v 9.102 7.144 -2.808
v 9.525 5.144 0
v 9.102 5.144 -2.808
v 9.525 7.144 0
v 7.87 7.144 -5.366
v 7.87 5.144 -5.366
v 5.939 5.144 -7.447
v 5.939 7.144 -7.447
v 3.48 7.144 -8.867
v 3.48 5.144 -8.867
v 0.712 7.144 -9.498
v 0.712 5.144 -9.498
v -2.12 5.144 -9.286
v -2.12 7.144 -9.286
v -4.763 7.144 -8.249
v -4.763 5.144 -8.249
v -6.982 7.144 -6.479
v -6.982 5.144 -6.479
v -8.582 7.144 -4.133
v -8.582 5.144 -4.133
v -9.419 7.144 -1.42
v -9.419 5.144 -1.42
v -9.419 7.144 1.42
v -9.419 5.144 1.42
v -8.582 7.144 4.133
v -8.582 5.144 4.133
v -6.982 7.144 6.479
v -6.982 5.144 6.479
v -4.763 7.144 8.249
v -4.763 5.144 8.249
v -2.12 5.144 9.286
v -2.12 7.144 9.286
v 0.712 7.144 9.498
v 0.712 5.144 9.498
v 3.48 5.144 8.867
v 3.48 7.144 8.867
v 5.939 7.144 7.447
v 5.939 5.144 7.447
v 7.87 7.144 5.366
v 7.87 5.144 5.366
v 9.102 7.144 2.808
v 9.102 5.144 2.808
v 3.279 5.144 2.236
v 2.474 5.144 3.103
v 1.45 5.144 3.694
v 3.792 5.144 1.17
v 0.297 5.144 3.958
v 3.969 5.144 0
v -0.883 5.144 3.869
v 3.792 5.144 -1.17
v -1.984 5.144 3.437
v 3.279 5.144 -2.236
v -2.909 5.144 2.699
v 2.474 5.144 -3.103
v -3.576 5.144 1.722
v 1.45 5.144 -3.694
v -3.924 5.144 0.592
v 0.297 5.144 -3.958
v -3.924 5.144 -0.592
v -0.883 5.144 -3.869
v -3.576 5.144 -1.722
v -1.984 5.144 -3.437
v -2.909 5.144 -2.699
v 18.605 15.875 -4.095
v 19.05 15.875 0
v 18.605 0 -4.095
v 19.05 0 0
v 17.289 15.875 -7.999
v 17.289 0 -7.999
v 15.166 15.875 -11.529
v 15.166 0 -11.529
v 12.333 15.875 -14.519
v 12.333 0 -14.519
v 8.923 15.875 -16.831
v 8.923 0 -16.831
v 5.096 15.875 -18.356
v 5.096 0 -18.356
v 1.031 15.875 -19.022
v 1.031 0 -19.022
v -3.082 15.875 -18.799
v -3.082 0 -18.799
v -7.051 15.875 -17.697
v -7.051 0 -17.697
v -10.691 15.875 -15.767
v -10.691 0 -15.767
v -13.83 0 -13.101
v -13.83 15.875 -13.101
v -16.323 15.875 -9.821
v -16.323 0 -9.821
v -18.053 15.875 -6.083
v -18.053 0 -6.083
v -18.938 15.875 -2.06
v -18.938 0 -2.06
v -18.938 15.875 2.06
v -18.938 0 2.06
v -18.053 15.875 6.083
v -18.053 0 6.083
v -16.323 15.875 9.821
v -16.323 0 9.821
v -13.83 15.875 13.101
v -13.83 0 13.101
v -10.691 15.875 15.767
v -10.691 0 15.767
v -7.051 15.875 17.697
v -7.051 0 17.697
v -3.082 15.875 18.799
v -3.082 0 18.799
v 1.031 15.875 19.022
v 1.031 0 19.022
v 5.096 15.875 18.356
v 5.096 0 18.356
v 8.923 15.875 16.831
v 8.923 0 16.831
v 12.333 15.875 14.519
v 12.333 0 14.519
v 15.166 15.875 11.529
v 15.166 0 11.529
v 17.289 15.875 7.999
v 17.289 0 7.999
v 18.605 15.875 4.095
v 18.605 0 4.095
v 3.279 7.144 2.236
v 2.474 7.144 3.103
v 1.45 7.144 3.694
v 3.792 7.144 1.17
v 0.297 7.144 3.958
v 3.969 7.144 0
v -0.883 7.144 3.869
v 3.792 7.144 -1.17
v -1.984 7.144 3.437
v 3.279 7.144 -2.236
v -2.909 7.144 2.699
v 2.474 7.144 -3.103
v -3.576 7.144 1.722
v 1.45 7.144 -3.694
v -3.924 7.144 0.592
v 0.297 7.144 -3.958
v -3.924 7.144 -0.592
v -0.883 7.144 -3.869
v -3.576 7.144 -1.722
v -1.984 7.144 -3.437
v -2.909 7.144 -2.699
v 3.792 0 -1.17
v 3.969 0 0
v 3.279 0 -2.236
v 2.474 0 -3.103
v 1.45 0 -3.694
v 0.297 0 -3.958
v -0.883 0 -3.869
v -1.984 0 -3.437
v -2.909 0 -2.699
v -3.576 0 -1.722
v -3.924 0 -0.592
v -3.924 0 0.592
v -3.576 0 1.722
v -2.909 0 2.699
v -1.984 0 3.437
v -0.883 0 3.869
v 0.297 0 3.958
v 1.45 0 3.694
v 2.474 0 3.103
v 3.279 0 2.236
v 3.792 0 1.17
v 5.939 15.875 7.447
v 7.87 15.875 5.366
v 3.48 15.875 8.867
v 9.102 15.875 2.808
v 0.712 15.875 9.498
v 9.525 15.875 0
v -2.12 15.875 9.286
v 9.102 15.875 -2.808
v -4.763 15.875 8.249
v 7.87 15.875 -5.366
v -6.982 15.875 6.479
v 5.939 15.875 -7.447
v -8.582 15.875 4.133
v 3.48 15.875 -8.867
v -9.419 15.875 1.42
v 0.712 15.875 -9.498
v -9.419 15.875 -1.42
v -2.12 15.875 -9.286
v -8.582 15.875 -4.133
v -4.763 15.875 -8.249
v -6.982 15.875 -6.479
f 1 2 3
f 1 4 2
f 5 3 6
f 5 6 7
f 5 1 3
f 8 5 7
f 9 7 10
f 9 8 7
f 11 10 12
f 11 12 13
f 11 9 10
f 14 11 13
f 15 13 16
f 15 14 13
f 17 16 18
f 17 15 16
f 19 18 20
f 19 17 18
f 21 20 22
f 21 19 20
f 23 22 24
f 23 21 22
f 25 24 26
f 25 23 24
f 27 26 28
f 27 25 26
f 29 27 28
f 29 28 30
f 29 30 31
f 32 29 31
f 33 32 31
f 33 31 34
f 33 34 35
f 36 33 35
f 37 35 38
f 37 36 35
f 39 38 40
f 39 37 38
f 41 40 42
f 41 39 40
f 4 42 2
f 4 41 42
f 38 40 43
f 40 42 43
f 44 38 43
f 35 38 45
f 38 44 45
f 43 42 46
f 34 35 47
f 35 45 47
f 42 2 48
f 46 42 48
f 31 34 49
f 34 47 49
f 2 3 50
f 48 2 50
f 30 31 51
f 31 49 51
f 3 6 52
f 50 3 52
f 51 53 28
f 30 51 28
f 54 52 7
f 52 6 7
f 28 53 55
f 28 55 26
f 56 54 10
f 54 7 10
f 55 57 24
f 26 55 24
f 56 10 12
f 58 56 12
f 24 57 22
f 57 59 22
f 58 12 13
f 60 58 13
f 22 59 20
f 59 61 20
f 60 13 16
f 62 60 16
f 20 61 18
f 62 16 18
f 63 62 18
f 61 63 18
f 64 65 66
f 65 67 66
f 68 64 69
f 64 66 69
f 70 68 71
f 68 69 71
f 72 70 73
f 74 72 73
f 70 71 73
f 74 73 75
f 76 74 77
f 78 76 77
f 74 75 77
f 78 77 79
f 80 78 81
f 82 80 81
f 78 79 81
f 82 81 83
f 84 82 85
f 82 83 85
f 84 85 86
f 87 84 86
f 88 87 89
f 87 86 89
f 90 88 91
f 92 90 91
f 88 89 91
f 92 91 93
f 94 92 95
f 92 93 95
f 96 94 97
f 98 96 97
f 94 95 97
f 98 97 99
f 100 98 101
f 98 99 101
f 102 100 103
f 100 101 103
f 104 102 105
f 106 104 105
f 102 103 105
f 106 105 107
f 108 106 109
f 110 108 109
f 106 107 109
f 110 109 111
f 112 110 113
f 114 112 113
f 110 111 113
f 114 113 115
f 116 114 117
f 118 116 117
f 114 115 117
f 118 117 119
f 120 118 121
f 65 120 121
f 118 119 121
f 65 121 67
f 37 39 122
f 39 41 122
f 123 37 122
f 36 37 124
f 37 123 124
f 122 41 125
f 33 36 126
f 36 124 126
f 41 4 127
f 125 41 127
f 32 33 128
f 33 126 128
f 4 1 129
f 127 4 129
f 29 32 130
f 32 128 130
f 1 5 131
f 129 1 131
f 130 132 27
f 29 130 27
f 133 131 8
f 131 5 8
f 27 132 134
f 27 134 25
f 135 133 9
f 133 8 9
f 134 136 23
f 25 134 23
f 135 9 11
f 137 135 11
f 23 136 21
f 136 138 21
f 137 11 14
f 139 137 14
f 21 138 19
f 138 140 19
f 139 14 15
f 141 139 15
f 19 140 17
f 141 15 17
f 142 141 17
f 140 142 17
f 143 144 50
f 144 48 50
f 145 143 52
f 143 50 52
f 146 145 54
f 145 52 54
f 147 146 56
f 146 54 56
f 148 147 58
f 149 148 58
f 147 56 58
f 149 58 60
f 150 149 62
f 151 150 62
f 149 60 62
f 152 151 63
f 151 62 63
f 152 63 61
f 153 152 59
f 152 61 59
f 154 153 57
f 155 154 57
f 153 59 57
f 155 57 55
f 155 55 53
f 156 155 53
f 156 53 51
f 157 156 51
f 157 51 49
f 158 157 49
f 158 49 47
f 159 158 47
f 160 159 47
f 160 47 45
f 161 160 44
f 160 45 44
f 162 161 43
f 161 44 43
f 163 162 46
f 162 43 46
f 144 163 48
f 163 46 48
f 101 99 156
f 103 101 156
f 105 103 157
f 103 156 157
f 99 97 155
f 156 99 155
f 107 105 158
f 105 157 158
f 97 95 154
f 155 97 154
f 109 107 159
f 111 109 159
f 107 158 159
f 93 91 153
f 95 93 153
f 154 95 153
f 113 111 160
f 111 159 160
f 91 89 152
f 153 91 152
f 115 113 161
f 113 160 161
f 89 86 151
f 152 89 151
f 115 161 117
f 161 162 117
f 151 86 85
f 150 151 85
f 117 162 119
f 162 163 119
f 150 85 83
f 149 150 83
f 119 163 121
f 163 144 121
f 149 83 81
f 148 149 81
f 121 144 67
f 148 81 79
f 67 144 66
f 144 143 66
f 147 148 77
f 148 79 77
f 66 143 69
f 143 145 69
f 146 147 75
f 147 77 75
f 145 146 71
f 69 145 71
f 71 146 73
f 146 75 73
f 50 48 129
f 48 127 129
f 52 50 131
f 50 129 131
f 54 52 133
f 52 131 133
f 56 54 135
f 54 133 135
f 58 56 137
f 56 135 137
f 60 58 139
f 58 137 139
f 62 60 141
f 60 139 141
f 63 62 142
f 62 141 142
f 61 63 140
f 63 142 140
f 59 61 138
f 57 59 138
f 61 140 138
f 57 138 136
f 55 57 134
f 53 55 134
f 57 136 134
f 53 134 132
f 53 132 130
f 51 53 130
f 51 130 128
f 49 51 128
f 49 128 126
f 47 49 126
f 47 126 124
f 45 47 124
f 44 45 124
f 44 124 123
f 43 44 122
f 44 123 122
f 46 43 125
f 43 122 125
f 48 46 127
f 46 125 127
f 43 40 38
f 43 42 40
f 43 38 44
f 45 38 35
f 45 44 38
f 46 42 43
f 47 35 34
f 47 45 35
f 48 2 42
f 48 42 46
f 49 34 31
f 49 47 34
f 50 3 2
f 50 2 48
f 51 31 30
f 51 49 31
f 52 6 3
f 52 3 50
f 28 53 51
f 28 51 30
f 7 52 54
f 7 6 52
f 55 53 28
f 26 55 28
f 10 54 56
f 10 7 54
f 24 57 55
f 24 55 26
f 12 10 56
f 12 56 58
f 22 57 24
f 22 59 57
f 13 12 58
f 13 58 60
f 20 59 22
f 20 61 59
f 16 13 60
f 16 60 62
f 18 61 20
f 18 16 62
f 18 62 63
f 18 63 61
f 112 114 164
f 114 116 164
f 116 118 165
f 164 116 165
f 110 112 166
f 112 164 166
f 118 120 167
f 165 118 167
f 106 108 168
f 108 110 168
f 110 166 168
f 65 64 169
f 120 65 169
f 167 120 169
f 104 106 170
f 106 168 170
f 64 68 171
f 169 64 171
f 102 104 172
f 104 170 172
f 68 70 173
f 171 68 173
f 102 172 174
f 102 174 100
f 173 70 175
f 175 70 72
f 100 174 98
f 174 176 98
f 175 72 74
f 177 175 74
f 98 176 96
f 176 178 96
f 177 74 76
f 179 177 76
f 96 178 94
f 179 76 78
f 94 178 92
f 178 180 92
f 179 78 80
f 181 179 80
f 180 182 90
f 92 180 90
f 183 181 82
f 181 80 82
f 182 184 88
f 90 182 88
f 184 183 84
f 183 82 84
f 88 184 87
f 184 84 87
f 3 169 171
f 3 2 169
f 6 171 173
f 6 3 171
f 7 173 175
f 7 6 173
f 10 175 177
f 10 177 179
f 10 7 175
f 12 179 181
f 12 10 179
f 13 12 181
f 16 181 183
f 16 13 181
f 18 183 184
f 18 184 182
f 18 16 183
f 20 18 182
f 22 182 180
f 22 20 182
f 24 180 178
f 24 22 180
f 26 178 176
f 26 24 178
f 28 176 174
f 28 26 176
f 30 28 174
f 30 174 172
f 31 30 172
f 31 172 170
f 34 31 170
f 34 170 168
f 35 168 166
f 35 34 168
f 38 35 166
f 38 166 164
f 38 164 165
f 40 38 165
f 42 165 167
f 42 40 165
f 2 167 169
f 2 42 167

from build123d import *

# Parameters (mm, degrees)
SKETCH1_4_W = 5.55625
SKETCH1_4_H = 2


with BuildPart() as part:
    # Sketch1 → Revolve1 (revolve)
    with BuildSketch(Plane.XY):
        Polygon((3.96875, 5.14375), (3.96875, 0), (19.05, 0), (19.05, 15.875), (9.525, 15.875), (9.525, 7.14375), (9.525, 5.14375), align=None)
    revolve(axis=Axis((0, 0, 0), (0, 1, 0)))


with BuildPart() as body_2:
    # Sketch1<4> → Revolve2 (revolve)
    with BuildSketch(Plane.XY):
        with Locations((6.746875, 6.14375)):
            Rectangle(SKETCH1_4_W, SKETCH1_4_H)
    revolve(axis=Axis((0, 0, 0), (0, 1, 0)))


solid = Compound([part.part, body_2.part])
